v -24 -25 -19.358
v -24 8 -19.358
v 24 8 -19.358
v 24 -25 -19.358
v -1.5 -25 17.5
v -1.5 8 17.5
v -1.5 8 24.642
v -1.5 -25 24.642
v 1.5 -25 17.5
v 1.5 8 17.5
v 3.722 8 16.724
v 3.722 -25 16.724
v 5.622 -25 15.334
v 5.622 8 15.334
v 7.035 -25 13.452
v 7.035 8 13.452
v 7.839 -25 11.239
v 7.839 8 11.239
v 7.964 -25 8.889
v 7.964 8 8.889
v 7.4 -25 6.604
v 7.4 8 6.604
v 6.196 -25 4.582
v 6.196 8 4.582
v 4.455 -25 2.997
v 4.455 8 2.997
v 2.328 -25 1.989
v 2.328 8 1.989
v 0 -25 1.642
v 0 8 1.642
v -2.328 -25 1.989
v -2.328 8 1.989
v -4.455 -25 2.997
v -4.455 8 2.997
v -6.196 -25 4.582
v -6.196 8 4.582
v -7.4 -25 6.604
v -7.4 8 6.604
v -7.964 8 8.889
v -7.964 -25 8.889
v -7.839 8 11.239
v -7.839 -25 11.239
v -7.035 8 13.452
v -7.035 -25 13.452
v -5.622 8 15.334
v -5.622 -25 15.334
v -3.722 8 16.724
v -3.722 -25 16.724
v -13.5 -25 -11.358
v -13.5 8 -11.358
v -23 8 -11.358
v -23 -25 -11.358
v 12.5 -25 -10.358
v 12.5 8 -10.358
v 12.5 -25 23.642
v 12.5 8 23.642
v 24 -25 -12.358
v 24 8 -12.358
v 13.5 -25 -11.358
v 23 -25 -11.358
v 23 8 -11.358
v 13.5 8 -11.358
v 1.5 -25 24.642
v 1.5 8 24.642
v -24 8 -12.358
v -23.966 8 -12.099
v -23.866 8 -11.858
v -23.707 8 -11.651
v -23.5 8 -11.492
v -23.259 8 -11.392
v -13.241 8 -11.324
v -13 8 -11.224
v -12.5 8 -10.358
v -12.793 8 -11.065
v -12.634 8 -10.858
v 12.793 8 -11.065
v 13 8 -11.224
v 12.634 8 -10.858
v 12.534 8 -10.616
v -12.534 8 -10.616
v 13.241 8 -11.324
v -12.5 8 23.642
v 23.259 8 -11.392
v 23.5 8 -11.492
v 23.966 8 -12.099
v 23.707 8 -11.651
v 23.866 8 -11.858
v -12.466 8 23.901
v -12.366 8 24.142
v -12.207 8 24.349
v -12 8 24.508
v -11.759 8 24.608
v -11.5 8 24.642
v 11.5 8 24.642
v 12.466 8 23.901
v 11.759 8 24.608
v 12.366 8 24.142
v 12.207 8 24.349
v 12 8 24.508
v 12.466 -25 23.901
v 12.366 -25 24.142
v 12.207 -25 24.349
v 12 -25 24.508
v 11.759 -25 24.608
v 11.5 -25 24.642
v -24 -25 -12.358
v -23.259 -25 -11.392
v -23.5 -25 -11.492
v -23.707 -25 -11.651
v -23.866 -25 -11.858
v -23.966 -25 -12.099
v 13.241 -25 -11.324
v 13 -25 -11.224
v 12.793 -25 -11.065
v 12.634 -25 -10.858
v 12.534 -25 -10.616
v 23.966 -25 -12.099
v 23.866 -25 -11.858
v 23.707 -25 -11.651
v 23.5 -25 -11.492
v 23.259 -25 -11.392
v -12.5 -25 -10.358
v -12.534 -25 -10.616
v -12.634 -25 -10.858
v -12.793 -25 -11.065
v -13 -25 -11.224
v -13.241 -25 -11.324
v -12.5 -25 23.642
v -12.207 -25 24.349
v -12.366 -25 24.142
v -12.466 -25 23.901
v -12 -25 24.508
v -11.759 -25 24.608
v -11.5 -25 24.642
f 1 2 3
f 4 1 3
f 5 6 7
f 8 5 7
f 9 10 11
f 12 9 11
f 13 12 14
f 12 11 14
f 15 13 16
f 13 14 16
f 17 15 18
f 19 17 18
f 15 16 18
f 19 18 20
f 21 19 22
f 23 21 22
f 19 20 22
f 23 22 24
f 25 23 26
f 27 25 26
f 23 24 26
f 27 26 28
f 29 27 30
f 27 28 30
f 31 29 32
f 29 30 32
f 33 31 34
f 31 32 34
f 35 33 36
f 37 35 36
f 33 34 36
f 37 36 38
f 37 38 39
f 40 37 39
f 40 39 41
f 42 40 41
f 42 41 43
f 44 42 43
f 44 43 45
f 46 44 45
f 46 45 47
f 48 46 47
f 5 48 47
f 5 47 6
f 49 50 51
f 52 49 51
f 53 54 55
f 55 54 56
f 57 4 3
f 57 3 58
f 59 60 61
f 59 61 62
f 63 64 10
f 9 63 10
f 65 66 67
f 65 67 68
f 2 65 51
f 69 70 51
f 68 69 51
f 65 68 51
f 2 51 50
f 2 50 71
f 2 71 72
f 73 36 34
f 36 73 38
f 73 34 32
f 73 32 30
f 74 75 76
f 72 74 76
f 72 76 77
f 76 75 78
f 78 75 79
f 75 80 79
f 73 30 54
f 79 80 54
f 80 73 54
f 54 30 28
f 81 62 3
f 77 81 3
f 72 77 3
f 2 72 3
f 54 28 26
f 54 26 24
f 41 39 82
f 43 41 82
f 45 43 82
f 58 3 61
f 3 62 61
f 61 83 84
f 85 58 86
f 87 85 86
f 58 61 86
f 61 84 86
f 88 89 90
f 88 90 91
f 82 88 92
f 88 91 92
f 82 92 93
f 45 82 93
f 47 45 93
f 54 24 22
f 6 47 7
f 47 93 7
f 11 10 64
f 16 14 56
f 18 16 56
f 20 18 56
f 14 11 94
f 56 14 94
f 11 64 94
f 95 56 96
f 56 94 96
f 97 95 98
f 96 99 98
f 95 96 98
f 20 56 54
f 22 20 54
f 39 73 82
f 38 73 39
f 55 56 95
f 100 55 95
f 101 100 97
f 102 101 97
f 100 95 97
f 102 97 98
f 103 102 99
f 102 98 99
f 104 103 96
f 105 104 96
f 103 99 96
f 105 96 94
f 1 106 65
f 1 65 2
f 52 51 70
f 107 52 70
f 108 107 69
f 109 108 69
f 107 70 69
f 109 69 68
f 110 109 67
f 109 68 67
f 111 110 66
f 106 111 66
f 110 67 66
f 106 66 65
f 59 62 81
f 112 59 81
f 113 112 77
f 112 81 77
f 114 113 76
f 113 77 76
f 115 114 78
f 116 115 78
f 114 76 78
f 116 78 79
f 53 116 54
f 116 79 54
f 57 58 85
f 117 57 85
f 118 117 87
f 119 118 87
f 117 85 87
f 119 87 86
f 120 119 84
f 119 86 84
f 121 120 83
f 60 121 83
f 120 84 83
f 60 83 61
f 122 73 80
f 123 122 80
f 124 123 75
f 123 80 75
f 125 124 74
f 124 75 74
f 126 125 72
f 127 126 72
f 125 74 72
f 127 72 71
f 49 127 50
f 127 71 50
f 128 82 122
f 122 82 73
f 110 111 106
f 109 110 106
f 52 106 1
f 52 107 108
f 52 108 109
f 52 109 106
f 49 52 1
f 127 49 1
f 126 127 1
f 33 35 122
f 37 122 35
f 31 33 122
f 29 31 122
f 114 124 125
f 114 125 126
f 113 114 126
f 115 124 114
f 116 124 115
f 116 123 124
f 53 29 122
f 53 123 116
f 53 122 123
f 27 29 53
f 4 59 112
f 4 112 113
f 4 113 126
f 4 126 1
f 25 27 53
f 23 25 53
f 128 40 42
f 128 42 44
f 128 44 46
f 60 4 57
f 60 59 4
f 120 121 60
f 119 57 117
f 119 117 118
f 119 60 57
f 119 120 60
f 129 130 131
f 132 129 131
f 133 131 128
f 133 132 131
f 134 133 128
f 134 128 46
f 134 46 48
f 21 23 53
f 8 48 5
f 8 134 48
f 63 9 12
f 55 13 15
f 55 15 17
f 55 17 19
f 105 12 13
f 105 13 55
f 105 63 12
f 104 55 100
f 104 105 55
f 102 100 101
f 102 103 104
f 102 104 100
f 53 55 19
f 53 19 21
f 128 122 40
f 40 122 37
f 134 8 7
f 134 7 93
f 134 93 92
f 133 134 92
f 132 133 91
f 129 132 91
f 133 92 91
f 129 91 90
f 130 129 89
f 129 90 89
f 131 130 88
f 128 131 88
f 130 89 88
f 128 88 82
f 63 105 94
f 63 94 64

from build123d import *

# Parameters (mm, degrees)
F1_DEPTH = 8
F2_DEPTH = 25


with BuildPart() as f1:
    # F0 (on Front) → F1 (new body, symmetric)
    with BuildSketch(Plane.XZ):
        with BuildLine():
            Line((-24, -12.357661), (-24, -19.357661))
            Line((-24, -19.357661), (24, -19.357661))
            Line((24, -19.357661), (24, -12.357661))
            ThreePointArc((24, -12.357661), (23.707107, -11.650554), (23, -11.357661))
            Line((23, -11.357661), (13.5, -11.357661))
            ThreePointArc((13.5, -11.357661), (12.792893, -11.064767), (12.5, -10.357661))
            Line((12.5, -10.357661), (12.5, 23.642339))
            ThreePointArc((12.5, 23.642339), (12.207107, 24.349446), (11.5, 24.642339))
            Line((11.5, 24.642339), (1.5, 24.642339))
            Line((1.5, 24.642339), (1.5, 17.500456))
            ThreePointArc((1.5, 17.500456), (0, 1.642339), (-1.5, 17.500456))
            Line((-1.5, 17.500456), (-1.5, 24.642339))
            Line((-1.5, 24.642339), (-11.5, 24.642339))
            ThreePointArc((-11.5, 24.642339), (-12.207107, 24.349446), (-12.5, 23.642339))
            Line((-12.5, 23.642339), (-12.5, -10.357661))
            ThreePointArc((-12.5, -10.357661), (-12.792893, -11.064767), (-13.5, -11.357661))
            Line((-13.5, -11.357661), (-23, -11.357661))
            ThreePointArc((-23, -11.357661), (-23.707107, -11.650554), (-24, -12.357661))
        make_face()
    extrude(amount=F1_DEPTH, both=True)

    # F0 (on Front) → F2 (join)
    with BuildSketch(Plane.XZ):
        with BuildLine():
            Line((-24, -12.357661), (-24, -19.357661))
            Line((-24, -19.357661), (24, -19.357661))
            Line((24, -19.357661), (24, -12.357661))
            ThreePointArc((24, -12.357661), (23.707107, -11.650554), (23, -11.357661))
            Line((23, -11.357661), (13.5, -11.357661))
            ThreePointArc((13.5, -11.357661), (12.792893, -11.064767), (12.5, -10.357661))
            Line((12.5, -10.357661), (12.5, 23.642339))
            ThreePointArc((12.5, 23.642339), (12.207107, 24.349446), (11.5, 24.642339))
            Line((11.5, 24.642339), (1.5, 24.642339))
            Line((1.5, 24.642339), (1.5, 17.500456))
            ThreePointArc((1.5, 17.500456), (0, 1.642339), (-1.5, 17.500456))
            Line((-1.5, 17.500456), (-1.5, 24.642339))
            Line((-1.5, 24.642339), (-11.5, 24.642339))
            ThreePointArc((-11.5, 24.642339), (-12.207107, 24.349446), (-12.5, 23.642339))
            Line((-12.5, 23.642339), (-12.5, -10.357661))
            ThreePointArc((-12.5, -10.357661), (-12.792893, -11.064767), (-13.5, -11.357661))
            Line((-13.5, -11.357661), (-23, -11.357661))
            ThreePointArc((-23, -11.357661), (-23.707107, -11.650554), (-24, -12.357661))
        make_face()
    extrude(amount=F2_DEPTH)


solid = f1.part
